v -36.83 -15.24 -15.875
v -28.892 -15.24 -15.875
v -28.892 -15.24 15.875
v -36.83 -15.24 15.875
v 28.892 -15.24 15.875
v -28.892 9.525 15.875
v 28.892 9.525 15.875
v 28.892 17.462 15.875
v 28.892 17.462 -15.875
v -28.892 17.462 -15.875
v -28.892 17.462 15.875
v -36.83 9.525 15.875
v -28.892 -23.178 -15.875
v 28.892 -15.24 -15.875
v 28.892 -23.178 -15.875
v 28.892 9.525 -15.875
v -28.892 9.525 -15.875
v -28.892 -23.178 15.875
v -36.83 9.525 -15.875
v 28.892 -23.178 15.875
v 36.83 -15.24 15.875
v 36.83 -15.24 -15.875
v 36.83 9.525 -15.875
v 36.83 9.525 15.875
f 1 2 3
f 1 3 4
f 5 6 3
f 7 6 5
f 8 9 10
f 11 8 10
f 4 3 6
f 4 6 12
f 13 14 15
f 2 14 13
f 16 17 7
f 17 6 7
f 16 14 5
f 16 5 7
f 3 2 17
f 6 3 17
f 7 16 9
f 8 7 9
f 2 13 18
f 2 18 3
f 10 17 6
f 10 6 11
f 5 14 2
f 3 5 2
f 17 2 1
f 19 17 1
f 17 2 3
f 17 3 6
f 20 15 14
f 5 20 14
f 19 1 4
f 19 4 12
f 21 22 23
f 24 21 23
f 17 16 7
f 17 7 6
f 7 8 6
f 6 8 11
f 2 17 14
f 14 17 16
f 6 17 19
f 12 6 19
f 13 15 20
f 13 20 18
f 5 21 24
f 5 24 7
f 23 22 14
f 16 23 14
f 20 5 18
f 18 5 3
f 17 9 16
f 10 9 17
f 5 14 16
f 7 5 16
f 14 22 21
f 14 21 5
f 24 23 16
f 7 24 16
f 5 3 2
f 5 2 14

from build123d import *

# Parameters (mm, degrees)
SKETCH1_W           = 57.785
SKETCH1_H           = 24.765
BOSS_EXTRUDE1_DEPTH = 15.875
SKETCH2_W           = 7.9375
SKETCH2_H           = 24.765
SKETCH2_W_2         = 57.785
SKETCH2_H_2         = 7.9375
BOSS_EXTRUDE2_DEPTH = 31.75


with BuildPart() as part:
    # Sketch1 → Boss-Extrude1 (new, symmetric)
    with BuildSketch(Plane.XY):
        with Locations((0, -2.8575)):
            Rectangle(SKETCH1_W, SKETCH1_H)
    extrude(amount=BOSS_EXTRUDE1_DEPTH, both=True)


with BuildPart() as body_2:
    # Sketch2 → Boss-Extrude2 (new body)
    with BuildSketch(Plane(origin=(0, 0, -15.875), x_dir=(-1, 0, 0), z_dir=(0, 0, -1))):
        with Locations((-32.86125, -2.8575)):
            Rectangle(SKETCH2_W, SKETCH2_H)
        with Locations((0, -19.20875)):
            Rectangle(SKETCH2_W_2, SKETCH2_H_2)
        with Locations((0, 13.49375)):
            Rectangle(SKETCH2_W_2, SKETCH2_H_2)
        with Locations((32.86125, -2.8575)):
            Rectangle(SKETCH2_W, SKETCH2_H)
    extrude(amount=-BOSS_EXTRUDE2_DEPTH)


solid = Compound([part.part, body_2.part])
